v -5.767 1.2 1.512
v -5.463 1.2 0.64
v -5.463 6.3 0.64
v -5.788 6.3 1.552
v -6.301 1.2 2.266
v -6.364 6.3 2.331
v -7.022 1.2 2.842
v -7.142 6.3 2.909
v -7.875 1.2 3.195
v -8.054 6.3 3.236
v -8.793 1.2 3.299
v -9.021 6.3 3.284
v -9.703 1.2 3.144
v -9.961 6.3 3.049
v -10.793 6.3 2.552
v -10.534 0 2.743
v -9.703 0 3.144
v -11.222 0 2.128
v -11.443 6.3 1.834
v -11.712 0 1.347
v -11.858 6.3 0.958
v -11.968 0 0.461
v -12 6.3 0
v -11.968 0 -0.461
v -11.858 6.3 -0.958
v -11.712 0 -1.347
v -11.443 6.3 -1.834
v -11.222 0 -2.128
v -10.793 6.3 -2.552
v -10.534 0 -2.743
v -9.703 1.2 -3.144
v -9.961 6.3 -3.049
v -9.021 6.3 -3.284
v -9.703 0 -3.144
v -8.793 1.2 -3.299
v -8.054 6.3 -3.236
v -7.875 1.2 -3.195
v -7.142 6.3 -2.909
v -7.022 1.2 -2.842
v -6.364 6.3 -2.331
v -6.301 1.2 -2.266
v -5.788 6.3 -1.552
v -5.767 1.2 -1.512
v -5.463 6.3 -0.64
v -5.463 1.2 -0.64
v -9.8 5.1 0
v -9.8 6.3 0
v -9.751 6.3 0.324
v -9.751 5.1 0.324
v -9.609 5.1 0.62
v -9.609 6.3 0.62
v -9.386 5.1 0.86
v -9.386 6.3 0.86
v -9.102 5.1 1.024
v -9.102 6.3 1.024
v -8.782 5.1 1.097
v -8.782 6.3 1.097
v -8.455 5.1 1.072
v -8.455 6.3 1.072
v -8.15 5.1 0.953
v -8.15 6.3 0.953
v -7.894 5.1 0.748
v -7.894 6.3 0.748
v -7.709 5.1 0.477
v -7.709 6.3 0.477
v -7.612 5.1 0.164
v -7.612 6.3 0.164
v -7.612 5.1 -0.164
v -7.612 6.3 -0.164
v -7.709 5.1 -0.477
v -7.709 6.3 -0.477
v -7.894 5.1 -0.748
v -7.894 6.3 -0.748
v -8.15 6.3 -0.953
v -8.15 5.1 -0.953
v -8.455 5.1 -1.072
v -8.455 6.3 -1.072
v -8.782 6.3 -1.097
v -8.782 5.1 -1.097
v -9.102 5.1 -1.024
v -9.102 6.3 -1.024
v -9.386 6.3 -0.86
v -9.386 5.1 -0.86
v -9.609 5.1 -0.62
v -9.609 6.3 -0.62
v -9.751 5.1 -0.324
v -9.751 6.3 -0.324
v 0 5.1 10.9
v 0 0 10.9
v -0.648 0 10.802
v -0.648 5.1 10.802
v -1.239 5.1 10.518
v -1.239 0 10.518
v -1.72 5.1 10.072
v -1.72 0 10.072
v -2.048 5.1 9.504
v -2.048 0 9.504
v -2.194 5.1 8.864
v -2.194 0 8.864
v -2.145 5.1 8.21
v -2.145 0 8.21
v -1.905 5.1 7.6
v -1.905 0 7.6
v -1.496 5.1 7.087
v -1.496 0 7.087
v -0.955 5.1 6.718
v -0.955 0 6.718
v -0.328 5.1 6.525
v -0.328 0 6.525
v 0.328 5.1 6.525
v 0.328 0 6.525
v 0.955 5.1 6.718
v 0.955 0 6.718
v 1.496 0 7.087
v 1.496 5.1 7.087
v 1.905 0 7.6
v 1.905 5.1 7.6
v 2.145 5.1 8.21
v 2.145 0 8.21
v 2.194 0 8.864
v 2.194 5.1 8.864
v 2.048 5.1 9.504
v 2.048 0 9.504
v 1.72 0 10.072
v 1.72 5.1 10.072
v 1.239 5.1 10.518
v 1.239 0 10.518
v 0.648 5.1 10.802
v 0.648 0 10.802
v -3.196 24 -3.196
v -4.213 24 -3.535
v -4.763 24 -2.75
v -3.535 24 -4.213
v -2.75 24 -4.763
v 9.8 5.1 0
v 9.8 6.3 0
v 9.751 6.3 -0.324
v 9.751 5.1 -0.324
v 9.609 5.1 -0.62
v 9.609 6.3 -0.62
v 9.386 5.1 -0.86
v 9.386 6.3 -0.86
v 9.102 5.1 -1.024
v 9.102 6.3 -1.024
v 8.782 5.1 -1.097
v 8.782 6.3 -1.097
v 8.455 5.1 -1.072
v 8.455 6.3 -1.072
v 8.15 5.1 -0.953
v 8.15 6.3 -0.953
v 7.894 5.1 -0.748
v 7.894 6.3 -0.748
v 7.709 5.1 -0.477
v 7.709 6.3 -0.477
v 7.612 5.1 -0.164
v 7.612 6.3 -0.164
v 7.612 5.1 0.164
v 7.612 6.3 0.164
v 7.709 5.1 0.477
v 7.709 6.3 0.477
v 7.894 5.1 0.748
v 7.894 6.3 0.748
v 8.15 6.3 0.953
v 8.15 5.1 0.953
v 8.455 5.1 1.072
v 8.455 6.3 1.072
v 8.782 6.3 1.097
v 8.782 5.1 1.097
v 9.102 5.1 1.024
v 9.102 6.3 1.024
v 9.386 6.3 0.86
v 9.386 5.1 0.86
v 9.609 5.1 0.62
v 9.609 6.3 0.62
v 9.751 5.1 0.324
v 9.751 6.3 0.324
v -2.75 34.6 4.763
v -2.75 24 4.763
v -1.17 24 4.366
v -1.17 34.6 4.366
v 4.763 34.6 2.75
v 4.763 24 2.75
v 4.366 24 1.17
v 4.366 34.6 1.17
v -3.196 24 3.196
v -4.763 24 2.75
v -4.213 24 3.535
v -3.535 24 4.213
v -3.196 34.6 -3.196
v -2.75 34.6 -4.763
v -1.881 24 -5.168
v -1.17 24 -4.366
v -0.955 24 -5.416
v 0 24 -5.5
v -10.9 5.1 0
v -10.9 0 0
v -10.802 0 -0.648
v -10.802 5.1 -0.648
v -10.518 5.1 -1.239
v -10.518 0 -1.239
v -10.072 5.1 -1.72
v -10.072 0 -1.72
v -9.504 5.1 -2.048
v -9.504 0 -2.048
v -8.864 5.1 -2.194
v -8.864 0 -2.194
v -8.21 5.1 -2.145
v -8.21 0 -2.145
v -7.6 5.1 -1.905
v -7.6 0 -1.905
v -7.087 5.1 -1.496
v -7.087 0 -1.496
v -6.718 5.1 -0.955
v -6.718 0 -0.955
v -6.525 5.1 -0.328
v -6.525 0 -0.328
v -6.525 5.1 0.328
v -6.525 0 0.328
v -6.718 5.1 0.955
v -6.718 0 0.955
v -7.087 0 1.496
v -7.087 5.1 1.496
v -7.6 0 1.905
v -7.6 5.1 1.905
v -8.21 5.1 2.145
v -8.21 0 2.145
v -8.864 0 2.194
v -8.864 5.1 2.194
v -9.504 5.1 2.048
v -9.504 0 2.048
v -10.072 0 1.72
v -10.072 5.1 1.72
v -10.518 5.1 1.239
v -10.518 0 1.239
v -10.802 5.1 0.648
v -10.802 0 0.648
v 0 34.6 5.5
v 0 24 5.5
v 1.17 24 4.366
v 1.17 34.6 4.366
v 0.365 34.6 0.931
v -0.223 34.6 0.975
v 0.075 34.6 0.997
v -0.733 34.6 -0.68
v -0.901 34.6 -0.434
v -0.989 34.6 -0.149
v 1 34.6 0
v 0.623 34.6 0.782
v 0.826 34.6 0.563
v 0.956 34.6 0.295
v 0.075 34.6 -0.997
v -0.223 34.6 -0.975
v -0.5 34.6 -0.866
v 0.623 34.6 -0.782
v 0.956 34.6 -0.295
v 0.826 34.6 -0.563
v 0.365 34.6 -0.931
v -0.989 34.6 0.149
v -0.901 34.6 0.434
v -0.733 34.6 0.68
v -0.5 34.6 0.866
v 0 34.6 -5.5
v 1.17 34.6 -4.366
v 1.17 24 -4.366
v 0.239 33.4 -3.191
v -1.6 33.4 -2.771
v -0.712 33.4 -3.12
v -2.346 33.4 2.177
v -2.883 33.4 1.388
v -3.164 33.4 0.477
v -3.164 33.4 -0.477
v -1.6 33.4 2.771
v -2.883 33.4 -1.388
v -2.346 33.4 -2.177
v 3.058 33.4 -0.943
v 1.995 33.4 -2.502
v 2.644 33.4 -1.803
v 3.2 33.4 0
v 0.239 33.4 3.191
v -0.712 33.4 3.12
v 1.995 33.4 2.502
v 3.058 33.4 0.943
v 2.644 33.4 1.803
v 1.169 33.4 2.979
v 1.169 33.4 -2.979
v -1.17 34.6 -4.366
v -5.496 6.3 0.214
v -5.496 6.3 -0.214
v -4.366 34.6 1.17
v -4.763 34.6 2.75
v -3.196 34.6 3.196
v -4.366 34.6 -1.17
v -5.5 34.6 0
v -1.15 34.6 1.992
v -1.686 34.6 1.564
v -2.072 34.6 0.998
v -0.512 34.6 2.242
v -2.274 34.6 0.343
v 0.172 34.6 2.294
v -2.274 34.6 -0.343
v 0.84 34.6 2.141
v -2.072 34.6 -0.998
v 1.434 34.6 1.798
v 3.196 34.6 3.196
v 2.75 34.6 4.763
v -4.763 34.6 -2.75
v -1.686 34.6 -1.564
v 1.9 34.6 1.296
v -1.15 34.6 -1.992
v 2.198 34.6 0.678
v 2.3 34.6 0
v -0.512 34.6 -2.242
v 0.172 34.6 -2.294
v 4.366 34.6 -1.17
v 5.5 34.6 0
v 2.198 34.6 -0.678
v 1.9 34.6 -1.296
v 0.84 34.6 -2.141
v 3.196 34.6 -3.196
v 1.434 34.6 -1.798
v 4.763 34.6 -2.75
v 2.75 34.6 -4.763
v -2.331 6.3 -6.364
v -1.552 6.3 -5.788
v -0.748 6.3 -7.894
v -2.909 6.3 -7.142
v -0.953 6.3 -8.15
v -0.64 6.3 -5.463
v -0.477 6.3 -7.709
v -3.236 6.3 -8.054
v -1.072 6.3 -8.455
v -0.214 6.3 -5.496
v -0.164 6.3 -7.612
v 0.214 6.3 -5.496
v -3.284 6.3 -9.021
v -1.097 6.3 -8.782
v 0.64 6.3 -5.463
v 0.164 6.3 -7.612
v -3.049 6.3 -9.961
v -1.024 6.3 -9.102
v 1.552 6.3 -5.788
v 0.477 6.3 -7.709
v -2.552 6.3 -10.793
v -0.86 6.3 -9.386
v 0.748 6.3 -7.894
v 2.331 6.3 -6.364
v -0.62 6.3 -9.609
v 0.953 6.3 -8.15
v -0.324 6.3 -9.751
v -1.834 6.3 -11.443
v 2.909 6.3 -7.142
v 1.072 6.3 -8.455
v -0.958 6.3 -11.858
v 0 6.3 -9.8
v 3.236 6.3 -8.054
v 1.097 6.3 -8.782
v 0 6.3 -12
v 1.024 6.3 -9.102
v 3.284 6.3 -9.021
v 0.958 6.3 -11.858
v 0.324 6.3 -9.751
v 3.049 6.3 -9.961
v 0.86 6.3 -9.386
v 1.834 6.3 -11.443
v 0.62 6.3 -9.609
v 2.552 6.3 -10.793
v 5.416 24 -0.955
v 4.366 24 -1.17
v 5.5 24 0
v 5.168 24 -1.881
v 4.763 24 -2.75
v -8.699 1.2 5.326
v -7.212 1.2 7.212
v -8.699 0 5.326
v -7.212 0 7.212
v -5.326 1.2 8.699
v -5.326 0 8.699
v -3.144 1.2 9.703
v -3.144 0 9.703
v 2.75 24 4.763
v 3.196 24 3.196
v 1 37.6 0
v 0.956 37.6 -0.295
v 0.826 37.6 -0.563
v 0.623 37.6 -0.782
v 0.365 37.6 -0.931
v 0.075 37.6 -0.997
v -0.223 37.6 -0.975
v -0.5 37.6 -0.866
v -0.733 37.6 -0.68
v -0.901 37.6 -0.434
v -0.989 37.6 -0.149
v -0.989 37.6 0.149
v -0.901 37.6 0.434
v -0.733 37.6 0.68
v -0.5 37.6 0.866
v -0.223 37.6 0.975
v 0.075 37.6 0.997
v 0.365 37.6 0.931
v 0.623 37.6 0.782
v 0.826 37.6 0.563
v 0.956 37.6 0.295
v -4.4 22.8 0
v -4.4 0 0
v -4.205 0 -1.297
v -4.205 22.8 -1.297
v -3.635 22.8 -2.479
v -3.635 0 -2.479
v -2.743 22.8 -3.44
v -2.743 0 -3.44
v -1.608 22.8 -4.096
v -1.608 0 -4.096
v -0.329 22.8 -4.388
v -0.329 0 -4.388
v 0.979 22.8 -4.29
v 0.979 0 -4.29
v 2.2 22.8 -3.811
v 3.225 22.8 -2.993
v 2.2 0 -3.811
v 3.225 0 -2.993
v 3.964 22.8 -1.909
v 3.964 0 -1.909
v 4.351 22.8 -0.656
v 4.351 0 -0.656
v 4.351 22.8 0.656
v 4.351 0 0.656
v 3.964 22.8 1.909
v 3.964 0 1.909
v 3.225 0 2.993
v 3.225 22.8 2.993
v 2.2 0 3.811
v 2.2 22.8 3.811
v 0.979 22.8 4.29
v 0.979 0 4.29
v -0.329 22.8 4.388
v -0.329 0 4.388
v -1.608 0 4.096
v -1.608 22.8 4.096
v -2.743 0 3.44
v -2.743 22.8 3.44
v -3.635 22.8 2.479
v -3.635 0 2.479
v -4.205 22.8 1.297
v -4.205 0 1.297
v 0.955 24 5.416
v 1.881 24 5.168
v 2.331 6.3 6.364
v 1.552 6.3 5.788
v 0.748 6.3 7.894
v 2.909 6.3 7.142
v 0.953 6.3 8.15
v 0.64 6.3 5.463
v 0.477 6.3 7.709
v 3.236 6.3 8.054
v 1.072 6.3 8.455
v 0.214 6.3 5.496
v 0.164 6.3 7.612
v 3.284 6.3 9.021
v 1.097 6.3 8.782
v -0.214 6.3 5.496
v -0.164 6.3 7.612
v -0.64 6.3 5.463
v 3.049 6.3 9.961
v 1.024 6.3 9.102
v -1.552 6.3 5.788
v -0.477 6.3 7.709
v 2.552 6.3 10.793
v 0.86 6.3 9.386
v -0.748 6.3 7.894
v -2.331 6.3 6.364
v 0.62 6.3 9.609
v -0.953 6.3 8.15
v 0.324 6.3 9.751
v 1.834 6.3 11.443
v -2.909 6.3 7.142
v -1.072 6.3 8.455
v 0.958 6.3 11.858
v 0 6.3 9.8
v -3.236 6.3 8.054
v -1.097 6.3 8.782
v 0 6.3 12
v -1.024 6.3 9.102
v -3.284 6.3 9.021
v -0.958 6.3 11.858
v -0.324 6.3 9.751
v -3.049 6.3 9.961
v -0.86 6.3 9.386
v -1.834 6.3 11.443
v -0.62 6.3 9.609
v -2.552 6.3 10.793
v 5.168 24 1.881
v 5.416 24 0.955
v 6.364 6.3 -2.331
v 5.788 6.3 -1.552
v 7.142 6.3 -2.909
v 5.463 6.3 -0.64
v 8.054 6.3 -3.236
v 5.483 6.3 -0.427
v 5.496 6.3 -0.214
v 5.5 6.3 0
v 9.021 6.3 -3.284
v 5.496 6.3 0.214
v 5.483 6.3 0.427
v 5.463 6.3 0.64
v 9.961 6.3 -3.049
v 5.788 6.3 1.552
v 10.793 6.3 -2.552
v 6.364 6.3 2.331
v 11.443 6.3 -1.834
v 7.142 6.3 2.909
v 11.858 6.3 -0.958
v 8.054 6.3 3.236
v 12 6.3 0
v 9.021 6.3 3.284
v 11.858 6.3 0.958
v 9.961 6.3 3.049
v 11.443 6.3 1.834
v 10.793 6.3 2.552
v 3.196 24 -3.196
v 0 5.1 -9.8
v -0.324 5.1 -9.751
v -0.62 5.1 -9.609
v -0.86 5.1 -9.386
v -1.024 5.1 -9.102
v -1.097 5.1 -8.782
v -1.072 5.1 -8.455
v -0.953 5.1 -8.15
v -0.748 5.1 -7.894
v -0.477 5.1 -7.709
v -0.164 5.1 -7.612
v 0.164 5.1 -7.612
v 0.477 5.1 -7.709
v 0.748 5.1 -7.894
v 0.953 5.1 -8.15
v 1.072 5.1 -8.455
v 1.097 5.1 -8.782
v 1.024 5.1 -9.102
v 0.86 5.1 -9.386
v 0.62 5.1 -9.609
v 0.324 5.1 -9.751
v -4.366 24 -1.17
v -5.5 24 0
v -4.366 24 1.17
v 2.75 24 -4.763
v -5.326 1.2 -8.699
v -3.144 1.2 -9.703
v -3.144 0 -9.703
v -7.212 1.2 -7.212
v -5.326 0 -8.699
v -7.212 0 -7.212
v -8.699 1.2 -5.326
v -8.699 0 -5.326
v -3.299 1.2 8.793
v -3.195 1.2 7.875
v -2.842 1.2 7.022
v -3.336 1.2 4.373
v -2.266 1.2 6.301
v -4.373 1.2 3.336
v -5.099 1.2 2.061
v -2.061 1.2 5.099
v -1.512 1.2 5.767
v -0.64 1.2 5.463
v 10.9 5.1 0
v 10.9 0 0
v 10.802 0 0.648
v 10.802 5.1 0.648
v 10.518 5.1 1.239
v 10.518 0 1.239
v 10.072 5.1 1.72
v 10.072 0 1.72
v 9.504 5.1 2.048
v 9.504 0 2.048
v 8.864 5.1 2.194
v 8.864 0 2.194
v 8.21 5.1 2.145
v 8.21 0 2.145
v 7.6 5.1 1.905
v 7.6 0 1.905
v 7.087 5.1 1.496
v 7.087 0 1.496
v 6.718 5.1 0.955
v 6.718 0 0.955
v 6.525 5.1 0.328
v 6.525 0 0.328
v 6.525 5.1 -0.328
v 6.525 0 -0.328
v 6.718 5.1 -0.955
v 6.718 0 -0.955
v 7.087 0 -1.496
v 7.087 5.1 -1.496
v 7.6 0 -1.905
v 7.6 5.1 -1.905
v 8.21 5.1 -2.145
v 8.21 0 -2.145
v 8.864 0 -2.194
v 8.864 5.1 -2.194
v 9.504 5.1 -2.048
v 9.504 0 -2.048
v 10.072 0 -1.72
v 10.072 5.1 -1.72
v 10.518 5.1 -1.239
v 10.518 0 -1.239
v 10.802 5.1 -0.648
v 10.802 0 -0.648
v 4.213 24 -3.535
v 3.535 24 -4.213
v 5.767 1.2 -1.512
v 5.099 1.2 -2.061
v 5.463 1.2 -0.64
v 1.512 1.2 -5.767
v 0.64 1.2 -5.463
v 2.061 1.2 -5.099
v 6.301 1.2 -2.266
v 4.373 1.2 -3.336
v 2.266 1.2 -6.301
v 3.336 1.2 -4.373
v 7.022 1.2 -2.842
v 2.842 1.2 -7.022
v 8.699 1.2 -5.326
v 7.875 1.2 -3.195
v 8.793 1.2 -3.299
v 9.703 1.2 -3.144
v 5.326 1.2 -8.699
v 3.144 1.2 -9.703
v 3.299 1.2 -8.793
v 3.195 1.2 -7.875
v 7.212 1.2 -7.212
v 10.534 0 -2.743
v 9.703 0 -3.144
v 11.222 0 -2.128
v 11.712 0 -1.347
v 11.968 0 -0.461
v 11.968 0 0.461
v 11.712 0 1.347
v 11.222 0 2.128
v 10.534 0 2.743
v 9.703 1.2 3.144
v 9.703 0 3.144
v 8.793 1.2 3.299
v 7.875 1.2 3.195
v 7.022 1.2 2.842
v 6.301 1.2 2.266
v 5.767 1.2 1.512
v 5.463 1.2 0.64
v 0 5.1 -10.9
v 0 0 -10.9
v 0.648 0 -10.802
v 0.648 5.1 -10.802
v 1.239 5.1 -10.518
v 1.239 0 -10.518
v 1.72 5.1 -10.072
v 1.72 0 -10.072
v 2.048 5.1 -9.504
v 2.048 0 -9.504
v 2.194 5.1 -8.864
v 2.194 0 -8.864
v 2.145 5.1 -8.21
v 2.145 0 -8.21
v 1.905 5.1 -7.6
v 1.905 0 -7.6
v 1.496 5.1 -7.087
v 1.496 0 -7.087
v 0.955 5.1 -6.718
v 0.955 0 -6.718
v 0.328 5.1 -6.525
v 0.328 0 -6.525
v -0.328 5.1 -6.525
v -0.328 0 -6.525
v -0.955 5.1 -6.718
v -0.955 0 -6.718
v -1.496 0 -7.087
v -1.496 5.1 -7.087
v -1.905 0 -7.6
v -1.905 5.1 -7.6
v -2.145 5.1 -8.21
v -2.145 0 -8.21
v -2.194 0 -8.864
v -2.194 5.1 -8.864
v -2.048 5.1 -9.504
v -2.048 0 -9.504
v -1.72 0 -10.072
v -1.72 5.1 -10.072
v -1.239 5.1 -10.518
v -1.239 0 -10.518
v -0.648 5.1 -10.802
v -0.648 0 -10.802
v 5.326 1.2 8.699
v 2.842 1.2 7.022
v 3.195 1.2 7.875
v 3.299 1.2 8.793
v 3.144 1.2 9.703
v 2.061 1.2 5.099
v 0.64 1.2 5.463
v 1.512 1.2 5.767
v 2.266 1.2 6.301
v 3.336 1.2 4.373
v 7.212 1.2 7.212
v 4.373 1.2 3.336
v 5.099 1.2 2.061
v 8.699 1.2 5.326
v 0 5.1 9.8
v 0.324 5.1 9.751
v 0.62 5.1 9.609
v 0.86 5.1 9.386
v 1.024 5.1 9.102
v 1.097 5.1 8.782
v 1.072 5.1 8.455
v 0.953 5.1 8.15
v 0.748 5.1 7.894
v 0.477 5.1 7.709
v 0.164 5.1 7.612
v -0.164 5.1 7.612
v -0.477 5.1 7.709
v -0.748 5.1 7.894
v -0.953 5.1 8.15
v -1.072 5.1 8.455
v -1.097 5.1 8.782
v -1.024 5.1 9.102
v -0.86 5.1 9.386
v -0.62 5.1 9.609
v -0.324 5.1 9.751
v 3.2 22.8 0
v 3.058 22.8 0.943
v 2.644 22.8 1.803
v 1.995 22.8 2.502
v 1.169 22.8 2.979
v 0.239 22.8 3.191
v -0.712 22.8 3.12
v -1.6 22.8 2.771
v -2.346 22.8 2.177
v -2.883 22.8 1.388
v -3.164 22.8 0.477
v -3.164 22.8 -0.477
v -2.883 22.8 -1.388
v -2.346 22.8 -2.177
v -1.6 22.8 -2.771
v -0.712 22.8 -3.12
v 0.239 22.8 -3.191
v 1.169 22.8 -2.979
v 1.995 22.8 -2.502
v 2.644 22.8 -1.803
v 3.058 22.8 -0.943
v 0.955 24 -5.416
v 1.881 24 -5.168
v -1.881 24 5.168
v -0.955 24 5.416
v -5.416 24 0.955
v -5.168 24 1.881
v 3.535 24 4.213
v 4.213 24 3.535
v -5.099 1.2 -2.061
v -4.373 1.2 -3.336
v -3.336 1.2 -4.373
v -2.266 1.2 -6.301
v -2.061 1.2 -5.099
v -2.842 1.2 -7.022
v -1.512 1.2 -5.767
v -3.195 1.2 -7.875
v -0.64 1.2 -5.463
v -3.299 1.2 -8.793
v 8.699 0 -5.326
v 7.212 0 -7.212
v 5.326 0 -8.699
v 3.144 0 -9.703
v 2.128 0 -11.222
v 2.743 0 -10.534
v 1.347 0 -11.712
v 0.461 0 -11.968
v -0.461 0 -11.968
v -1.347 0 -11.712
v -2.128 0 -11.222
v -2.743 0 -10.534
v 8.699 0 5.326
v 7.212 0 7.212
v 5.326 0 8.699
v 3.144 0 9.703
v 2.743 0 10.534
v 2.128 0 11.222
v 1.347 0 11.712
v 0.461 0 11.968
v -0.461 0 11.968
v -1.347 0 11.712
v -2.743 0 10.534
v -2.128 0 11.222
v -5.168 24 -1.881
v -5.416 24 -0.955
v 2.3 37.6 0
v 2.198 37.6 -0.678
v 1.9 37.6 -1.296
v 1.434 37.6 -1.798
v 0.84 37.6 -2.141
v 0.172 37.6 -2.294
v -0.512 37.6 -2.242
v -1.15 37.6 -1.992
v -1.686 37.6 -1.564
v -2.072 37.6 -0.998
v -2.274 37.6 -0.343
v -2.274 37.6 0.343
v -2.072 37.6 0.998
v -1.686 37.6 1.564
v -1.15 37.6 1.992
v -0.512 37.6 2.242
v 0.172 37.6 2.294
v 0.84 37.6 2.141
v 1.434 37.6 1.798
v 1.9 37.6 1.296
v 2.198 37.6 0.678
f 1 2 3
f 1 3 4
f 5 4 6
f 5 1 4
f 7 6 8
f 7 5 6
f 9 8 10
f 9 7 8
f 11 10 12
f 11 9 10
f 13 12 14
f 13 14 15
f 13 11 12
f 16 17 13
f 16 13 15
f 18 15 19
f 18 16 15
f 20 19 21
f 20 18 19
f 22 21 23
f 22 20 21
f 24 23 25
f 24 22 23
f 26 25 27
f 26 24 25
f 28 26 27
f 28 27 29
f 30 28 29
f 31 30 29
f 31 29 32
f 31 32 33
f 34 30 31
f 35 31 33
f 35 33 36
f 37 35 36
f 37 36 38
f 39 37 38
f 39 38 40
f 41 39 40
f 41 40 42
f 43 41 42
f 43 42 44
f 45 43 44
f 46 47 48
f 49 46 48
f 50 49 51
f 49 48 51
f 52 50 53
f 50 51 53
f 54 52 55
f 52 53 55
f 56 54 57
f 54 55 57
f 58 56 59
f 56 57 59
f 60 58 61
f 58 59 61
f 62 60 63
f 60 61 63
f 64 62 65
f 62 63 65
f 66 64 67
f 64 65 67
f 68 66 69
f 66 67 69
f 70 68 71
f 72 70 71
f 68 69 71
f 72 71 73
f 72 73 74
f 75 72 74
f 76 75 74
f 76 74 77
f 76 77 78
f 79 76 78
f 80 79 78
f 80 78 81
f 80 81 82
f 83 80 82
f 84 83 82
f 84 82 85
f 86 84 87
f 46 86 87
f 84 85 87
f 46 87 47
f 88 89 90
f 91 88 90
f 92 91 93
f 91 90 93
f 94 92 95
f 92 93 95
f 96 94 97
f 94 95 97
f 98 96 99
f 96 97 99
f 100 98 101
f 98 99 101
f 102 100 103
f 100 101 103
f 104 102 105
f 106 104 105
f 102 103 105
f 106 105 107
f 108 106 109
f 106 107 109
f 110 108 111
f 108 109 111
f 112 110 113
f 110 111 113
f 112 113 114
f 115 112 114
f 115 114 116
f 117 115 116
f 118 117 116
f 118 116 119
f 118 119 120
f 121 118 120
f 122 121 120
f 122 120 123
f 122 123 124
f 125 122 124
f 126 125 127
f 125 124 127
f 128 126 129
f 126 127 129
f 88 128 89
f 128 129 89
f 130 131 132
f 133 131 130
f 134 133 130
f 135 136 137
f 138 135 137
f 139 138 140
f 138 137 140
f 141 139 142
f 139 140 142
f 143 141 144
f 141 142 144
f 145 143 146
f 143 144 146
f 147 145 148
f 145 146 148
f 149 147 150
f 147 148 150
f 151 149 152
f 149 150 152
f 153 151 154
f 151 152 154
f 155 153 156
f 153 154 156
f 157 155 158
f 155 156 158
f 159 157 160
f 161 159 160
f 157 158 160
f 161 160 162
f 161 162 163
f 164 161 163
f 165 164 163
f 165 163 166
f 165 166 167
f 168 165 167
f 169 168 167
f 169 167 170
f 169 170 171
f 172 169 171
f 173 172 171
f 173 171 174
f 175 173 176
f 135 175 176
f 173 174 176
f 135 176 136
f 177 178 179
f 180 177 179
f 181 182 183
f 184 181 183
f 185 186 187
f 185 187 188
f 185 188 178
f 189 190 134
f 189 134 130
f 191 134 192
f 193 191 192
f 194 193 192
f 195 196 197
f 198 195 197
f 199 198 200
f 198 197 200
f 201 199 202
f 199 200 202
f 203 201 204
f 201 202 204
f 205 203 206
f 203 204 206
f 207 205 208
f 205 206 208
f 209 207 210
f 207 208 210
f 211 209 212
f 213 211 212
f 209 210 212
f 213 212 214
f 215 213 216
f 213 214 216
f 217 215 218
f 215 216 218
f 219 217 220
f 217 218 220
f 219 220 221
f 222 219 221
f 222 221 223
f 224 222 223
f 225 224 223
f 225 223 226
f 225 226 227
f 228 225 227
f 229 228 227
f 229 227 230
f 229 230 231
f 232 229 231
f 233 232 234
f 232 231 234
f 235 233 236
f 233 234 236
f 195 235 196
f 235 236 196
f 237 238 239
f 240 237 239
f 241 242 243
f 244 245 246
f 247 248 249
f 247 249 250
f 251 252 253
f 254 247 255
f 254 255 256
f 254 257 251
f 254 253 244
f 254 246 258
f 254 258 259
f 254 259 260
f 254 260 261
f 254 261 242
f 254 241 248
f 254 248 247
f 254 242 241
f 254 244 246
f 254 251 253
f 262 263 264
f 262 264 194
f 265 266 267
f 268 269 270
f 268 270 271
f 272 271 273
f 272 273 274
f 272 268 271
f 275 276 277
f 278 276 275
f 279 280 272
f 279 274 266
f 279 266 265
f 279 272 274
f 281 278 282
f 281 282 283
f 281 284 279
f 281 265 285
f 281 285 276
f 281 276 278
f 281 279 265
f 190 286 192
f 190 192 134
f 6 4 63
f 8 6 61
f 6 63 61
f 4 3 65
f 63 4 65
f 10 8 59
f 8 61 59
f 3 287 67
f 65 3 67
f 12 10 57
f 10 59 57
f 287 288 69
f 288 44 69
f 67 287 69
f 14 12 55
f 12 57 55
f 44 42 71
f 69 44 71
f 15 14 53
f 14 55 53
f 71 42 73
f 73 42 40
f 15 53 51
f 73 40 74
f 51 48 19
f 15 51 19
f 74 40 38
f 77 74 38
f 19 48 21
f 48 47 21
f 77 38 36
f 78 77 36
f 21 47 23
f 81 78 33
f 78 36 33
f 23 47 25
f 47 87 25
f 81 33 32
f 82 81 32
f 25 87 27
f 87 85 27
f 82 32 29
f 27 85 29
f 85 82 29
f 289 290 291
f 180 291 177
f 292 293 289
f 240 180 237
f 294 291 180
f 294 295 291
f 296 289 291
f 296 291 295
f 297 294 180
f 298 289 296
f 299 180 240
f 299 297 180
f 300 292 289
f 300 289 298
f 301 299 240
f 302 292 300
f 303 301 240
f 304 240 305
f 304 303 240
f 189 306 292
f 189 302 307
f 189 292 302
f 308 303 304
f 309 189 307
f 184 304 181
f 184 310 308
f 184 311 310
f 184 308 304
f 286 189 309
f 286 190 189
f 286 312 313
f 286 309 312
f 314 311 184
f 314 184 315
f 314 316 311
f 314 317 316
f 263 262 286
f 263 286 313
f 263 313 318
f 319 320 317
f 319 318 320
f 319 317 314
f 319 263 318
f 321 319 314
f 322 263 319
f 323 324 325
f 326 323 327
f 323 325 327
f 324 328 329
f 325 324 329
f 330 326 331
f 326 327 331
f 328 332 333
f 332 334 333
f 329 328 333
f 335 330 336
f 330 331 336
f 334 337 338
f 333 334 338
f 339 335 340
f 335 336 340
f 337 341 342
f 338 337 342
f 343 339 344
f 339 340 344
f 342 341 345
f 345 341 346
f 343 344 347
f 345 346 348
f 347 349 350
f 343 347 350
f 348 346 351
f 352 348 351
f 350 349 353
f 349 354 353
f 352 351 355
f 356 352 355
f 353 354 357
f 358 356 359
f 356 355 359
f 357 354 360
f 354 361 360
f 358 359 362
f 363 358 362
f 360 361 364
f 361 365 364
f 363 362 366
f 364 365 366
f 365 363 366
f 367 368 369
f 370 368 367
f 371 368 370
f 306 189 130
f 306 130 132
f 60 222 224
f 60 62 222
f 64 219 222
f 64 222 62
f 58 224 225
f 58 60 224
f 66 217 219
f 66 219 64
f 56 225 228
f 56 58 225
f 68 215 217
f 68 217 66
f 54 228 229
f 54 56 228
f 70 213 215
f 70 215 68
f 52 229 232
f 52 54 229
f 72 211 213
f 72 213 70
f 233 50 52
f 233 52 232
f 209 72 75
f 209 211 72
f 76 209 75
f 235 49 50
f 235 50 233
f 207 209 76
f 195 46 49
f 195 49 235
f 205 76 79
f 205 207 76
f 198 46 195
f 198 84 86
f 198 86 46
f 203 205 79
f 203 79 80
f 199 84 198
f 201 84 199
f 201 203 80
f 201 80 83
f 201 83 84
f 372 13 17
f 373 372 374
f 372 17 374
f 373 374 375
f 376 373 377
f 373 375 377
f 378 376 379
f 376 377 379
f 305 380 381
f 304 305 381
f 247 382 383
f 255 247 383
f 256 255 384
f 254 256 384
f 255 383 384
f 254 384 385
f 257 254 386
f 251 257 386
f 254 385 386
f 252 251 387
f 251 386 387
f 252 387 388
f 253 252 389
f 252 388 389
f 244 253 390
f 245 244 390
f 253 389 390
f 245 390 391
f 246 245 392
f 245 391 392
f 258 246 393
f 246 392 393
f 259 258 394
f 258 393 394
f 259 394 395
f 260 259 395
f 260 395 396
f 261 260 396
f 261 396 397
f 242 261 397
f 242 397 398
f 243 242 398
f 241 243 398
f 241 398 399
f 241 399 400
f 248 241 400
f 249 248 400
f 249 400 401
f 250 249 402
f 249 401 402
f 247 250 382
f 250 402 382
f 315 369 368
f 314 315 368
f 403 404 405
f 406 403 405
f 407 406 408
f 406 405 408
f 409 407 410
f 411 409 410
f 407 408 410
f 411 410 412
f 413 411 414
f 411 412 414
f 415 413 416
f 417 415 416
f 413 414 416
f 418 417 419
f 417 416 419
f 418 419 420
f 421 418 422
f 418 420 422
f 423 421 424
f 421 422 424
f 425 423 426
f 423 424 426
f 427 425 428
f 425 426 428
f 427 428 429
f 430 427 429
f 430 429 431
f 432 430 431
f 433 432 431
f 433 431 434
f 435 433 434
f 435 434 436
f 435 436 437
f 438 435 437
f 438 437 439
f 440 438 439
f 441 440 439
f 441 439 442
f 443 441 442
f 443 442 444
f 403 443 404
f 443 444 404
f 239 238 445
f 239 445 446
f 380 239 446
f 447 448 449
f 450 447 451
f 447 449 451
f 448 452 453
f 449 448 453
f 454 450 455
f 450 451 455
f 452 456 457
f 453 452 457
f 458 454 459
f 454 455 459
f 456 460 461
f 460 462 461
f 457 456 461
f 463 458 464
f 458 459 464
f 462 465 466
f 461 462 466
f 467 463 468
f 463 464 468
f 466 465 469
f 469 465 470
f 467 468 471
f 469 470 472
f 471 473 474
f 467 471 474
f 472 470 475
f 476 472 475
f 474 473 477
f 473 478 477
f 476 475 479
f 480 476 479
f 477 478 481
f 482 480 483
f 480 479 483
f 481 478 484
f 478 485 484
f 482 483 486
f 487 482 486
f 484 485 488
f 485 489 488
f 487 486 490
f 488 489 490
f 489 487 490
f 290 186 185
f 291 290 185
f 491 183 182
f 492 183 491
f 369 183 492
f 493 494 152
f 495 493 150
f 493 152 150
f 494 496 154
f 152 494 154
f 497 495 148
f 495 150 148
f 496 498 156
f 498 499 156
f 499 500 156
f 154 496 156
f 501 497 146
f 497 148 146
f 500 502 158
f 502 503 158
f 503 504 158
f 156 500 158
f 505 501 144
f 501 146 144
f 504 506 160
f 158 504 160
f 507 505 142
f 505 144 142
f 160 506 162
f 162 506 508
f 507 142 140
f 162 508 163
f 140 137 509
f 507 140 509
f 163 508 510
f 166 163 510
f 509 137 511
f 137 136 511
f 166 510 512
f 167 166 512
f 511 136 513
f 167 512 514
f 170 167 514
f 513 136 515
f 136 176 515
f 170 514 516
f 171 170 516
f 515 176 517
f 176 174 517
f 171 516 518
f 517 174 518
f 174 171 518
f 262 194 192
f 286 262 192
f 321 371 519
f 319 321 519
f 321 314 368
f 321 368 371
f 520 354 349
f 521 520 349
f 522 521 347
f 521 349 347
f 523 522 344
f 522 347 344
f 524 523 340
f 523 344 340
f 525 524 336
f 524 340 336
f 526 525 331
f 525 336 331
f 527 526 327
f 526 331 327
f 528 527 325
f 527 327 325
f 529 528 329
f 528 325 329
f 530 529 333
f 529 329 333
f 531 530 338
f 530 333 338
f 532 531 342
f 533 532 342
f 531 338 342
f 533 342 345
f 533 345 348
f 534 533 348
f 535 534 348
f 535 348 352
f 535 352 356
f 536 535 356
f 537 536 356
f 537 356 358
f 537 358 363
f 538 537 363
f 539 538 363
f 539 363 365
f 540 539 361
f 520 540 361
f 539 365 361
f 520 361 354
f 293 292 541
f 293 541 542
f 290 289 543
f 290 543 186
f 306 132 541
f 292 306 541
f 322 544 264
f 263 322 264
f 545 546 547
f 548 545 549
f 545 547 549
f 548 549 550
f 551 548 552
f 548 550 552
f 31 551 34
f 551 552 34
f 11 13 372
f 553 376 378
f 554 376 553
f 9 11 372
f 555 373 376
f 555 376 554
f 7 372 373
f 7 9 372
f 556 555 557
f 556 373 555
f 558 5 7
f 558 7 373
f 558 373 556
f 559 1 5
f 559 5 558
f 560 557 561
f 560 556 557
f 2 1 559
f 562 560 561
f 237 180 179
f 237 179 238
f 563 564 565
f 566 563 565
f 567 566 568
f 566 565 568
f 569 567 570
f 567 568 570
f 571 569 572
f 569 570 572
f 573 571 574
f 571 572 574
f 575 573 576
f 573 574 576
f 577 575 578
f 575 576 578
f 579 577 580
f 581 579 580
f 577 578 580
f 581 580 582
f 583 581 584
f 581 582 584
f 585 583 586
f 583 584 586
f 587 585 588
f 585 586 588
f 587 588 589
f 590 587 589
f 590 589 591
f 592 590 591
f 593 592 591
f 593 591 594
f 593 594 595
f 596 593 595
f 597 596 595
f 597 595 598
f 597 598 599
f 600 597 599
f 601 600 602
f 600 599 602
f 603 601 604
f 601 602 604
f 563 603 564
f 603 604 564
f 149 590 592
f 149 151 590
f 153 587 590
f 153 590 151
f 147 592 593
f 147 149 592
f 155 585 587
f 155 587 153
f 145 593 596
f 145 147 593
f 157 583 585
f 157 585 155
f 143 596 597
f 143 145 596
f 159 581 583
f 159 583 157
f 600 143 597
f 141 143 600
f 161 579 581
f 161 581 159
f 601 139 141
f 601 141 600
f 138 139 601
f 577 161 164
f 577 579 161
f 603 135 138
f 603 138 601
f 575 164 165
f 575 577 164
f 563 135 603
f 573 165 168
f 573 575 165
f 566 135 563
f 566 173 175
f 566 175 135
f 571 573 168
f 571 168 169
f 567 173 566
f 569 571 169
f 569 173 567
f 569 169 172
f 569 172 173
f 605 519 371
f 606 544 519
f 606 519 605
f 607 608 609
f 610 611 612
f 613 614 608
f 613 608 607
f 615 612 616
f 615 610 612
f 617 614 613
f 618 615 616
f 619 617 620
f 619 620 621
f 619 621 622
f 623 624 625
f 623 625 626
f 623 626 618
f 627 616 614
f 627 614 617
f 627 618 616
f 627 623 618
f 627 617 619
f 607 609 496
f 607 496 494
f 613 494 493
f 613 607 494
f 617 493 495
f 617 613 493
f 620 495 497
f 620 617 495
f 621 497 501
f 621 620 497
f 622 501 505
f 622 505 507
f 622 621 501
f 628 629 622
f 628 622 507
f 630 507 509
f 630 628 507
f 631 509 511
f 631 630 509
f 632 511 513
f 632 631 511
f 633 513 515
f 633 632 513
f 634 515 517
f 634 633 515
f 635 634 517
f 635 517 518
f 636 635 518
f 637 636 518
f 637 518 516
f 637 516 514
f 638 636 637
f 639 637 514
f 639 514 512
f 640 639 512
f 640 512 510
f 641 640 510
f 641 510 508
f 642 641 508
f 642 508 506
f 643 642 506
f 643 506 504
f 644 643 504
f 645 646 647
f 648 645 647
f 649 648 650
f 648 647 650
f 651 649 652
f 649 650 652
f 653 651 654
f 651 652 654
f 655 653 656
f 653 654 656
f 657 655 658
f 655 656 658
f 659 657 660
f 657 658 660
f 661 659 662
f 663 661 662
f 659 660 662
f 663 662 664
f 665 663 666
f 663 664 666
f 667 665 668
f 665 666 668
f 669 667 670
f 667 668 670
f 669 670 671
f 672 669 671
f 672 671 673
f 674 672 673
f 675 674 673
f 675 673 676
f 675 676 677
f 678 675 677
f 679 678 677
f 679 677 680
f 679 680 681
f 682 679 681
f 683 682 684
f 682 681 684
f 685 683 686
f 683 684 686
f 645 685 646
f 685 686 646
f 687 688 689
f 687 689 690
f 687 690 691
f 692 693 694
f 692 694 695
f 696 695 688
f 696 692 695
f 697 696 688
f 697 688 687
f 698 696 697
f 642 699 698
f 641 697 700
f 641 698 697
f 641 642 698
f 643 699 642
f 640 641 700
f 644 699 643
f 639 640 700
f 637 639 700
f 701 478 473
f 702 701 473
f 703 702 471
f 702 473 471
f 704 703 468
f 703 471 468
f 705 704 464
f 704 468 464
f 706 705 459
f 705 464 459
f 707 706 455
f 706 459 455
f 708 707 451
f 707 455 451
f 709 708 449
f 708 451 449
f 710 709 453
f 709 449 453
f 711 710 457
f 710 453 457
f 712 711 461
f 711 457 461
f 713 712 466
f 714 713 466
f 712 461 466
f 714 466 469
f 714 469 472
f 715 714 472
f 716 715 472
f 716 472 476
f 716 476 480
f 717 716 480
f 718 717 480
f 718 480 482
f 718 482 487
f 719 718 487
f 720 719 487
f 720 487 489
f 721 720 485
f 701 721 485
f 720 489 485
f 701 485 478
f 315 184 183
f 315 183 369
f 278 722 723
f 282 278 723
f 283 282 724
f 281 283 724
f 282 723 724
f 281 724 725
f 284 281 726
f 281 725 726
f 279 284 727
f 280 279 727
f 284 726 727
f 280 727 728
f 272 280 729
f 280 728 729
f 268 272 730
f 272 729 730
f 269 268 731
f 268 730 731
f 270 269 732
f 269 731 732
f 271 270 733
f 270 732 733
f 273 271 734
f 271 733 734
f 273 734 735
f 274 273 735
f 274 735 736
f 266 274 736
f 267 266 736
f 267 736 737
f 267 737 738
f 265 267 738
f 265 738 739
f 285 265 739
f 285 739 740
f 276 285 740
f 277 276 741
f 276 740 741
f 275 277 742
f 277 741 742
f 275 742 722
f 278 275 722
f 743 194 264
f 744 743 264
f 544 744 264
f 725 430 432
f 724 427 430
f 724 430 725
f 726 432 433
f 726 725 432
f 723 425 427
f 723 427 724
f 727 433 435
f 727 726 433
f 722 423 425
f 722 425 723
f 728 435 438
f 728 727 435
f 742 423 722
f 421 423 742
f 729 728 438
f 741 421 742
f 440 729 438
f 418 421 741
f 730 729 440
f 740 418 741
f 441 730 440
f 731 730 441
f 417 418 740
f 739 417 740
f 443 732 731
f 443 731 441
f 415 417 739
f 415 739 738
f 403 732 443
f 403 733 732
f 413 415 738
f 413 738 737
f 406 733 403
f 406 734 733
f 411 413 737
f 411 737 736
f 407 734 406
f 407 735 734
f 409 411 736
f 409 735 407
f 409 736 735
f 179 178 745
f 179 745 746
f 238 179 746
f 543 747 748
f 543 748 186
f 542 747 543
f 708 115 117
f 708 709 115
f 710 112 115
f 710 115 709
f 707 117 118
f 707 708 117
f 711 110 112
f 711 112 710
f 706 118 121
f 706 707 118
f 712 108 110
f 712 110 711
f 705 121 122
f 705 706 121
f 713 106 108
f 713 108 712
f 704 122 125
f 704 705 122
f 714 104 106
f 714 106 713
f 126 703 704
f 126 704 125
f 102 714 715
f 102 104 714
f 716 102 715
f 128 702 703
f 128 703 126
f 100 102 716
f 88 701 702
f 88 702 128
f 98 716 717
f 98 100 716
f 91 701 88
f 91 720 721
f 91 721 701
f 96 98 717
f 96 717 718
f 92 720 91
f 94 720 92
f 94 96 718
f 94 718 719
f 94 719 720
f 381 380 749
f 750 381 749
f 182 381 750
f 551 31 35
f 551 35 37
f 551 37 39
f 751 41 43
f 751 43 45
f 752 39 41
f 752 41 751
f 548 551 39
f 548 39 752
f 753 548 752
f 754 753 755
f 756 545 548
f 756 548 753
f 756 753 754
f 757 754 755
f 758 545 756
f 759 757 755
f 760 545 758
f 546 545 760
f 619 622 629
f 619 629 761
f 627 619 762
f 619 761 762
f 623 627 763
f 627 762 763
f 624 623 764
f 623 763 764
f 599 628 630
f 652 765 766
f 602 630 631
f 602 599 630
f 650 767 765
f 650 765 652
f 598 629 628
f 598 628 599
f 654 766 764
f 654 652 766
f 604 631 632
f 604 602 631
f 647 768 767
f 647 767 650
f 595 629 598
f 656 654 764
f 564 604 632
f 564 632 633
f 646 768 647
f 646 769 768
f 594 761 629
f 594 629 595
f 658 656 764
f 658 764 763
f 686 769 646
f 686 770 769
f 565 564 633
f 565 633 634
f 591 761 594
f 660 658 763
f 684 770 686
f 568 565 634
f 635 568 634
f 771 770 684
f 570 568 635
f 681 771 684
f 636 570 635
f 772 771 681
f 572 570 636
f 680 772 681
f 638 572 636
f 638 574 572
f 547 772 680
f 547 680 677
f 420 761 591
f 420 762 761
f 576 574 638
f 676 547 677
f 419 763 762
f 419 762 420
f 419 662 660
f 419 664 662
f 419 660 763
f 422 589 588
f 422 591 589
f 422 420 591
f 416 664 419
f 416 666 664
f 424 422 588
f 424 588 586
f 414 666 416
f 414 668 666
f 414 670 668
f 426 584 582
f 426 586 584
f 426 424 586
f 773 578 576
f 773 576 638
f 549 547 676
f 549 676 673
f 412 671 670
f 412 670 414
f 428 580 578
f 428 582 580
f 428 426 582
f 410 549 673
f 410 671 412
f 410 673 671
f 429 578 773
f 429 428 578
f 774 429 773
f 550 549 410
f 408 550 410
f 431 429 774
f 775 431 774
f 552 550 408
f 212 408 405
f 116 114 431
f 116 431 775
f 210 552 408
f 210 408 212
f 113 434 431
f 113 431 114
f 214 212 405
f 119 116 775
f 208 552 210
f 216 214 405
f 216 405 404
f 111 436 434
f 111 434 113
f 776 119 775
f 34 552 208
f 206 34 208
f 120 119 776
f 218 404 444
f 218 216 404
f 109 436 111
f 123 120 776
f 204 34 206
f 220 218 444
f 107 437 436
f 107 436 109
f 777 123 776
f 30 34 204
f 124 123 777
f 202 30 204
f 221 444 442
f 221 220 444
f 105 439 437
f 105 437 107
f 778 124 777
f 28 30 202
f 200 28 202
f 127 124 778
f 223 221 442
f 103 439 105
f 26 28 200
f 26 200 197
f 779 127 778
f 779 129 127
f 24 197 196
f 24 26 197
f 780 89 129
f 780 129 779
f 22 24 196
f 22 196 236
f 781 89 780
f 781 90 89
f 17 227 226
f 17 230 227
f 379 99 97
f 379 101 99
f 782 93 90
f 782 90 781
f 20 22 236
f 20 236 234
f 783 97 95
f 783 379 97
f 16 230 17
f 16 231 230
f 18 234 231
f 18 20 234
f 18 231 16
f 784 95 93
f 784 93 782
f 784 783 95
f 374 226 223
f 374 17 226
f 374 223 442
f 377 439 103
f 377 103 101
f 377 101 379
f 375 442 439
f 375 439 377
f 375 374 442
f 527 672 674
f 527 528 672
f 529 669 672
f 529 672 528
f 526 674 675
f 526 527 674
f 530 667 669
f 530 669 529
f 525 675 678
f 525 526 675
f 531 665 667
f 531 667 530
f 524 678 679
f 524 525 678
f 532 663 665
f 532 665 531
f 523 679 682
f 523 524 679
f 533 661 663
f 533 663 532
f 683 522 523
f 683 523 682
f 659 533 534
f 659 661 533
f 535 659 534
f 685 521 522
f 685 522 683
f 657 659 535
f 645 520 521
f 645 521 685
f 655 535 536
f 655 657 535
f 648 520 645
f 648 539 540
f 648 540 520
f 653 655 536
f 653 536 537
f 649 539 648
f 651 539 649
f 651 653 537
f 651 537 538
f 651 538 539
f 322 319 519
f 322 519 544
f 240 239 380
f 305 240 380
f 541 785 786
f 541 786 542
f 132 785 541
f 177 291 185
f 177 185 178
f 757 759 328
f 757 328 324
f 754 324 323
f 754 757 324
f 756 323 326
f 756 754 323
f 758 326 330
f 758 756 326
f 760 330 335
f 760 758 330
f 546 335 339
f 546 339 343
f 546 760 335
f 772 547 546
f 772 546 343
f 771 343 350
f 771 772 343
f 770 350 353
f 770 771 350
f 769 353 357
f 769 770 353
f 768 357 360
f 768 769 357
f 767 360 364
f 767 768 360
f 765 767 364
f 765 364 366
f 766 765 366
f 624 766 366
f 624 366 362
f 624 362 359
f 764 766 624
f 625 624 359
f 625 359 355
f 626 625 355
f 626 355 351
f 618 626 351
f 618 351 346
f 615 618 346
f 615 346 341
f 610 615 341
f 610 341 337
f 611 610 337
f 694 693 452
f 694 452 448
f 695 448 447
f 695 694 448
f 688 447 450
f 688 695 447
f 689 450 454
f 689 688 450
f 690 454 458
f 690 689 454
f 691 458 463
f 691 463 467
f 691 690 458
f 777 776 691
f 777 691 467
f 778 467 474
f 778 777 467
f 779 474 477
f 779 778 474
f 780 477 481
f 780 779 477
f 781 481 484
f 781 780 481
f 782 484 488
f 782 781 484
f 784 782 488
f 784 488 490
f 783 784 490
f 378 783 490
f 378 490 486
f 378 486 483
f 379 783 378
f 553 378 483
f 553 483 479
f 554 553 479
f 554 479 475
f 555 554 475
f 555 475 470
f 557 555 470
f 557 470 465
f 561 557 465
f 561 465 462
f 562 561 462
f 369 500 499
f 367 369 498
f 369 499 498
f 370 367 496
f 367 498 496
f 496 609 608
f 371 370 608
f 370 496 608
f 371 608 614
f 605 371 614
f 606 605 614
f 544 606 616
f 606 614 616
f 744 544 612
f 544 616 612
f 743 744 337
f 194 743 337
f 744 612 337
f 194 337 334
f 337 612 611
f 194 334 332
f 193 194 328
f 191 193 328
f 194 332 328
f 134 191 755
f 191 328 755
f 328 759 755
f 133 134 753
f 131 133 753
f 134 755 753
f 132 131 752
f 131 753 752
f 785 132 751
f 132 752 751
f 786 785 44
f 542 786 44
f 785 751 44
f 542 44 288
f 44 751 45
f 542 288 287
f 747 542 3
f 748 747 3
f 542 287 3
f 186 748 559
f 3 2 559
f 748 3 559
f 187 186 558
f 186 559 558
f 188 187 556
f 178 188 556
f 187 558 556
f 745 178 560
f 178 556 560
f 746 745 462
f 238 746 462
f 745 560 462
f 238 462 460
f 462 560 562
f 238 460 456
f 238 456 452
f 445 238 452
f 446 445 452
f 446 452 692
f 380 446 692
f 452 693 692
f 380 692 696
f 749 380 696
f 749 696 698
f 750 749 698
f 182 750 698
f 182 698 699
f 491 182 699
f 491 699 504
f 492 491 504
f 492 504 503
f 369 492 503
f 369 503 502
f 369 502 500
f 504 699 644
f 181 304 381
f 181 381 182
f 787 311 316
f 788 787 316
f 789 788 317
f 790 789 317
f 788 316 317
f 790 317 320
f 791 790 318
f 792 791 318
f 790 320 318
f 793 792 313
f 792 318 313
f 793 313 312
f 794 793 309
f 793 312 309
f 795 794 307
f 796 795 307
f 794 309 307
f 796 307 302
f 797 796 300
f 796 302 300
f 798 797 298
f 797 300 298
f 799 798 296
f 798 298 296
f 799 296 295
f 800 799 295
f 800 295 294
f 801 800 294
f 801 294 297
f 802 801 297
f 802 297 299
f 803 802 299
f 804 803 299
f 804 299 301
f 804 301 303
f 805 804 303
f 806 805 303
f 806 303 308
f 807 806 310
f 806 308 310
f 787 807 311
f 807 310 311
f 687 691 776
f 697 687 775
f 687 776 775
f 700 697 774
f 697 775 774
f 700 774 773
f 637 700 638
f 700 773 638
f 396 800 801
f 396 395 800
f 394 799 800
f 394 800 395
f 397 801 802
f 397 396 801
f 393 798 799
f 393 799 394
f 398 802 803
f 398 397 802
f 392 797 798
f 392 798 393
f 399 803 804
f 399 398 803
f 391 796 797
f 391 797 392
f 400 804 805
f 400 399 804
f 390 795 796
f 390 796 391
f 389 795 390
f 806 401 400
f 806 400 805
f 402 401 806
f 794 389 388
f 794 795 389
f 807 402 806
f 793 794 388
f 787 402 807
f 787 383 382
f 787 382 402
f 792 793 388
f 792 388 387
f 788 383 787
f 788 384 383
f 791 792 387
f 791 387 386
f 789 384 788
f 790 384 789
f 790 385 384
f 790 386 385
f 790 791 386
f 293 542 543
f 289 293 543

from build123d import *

# Parameters (mm, degrees)
SKETCH1_R            = 10.2
BOSS_EXTRUDE1_DEPTH  = 1.2
SKETCH3_R            = 5.5
BOSS_EXTRUDE2_DEPTH  = 22.8
SKETCH6_R            = 3.3
BOSS_EXTRUDE7_DEPTH  = 6.3
SKETCH7_R            = 2.2
CUT_EXTRUDE1_DEPTH   = 5.1
SKETCH8_R            = 1.1
CUT_EXTRUDE2_DEPTH   = 1.2
CIRPATTERN1_COUNT    = 4
SKETCH9_R            = 4.4
CUT_EXTRUDE3_DEPTH   = 22.8
SKETCH10_R           = 4.5
BOSS_EXTRUDE8_DEPTH  = 10.6
BOSS_EXTRUDE9_DEPTH  = 10.6
CIRPATTERN2_COUNT    = 12
SKETCH12_R           = 3.2
CUT_EXTRUDE4_DEPTH   = 10.6
SKETCH13_R           = 2.3
BOSS_EXTRUDE10_DEPTH = 3
SKETCH14_R           = 1
CUT_EXTRUDE5_DEPTH   = 3


with BuildPart() as part:
    # Sketch1 → Boss-Extrude1 (new body)
    with BuildSketch(Plane(origin=(0, 0, 0), x_dir=(1, 0, 0), z_dir=(0, 1, 0))):
        Circle(SKETCH1_R)
    extrude(amount=BOSS_EXTRUDE1_DEPTH)

    # Sketch3 → Boss-Extrude2 (add)
    with BuildSketch(Plane(origin=(0, 1.2, 0), x_dir=(1, 0, 0), z_dir=(0, 1, 0))):
        Circle(SKETCH3_R)
    extrude(amount=BOSS_EXTRUDE2_DEPTH)

    # Sketch6 → Boss-Extrude7 (add)
    with BuildSketch(Plane.XZ):
        with Locations((8.7, 0)):
            Circle(SKETCH6_R)
    boss_extrude7 = extrude(amount=-BOSS_EXTRUDE7_DEPTH)

    # Sketch7 → Cut-Extrude1 (cut)
    with BuildSketch(Plane.XZ):
        with Locations((8.7, 0)):
            Circle(SKETCH7_R)
    cut_extrude1 = extrude(amount=-CUT_EXTRUDE1_DEPTH, mode=Mode.SUBTRACT)

    # Sketch8 → Cut-Extrude2 (cut)
    with BuildSketch(Plane(origin=(0, 6.3, 0), x_dir=(1, 0, 0), z_dir=(0, 1, 0))):
        with Locations((8.7, 0)):
            Circle(SKETCH8_R)
    cut_extrude2 = extrude(amount=-CUT_EXTRUDE2_DEPTH, mode=Mode.SUBTRACT)

    # CirPattern1: Boss-Extrude7, Cut-Extrude1, Cut-Extrude2 ×4 about axis
    cirpattern1_axis = Axis((0, 25.2, 0), (0, -1, 0))
    add([boss_extrude7.rotate(cirpattern1_axis, i * 360 / CIRPATTERN1_COUNT) for i in range(1, CIRPATTERN1_COUNT)])
    add([cut_extrude1.rotate(cirpattern1_axis, i * 360 / CIRPATTERN1_COUNT) for i in range(1, CIRPATTERN1_COUNT)], mode=Mode.SUBTRACT)
    add([cut_extrude2.rotate(cirpattern1_axis, i * 360 / CIRPATTERN1_COUNT) for i in range(1, CIRPATTERN1_COUNT)], mode=Mode.SUBTRACT)

    # Sketch9 → Cut-Extrude3 (cut)
    with BuildSketch(Plane(origin=(0, 0, 0), x_dir=(-1, 0, 0), z_dir=(0, -1, 0))):
        Circle(SKETCH9_R)
    extrude(amount=-CUT_EXTRUDE3_DEPTH, mode=Mode.SUBTRACT)

    # Sketch10 → Boss-Extrude8 (add)
    with BuildSketch(Plane(origin=(0, 24, 0), x_dir=(1, 0, 0), z_dir=(0, 1, 0))):
        Circle(SKETCH10_R)
    extrude(amount=BOSS_EXTRUDE8_DEPTH)

    # Sketch11 → Boss-Extrude9 (add)
    with BuildSketch(Plane(origin=(0, 24, 0), x_dir=(1, 0, 0), z_dir=(0, 1, 0))):
        Polygon((-1.2, 4.337049688), (1.2, 4.337049688), (0, 5.5), align=None)
    boss_extrude9 = extrude(amount=BOSS_EXTRUDE9_DEPTH)

    # CirPattern2: Boss-Extrude9 ×12 about axis
    cirpattern2_axis = Axis((0, 25.2, 0), (0, -1, 0))
    for i in range(1, CIRPATTERN2_COUNT):
        add(boss_extrude9.rotate(cirpattern2_axis, i * 360 / CIRPATTERN2_COUNT))

    # Sketch12 → Cut-Extrude4 (cut)
    with BuildSketch(Plane.XZ.offset(-22.8)):
        Circle(SKETCH12_R)
    extrude(amount=-CUT_EXTRUDE4_DEPTH, mode=Mode.SUBTRACT)

    # Sketch13 → Boss-Extrude10 (add)
    with BuildSketch(Plane(origin=(0, 34.6, 0), x_dir=(1, 0, 0), z_dir=(0, 1, 0))):
        Circle(SKETCH13_R)
    extrude(amount=BOSS_EXTRUDE10_DEPTH)

    # Sketch14 → Cut-Extrude5 (cut)
    with BuildSketch(Plane(origin=(0, 37.6, 0), x_dir=(1, 0, 0), z_dir=(0, 1, 0))):
        Circle(SKETCH14_R)
    extrude(amount=-CUT_EXTRUDE5_DEPTH, mode=Mode.SUBTRACT)


solid = part.part
